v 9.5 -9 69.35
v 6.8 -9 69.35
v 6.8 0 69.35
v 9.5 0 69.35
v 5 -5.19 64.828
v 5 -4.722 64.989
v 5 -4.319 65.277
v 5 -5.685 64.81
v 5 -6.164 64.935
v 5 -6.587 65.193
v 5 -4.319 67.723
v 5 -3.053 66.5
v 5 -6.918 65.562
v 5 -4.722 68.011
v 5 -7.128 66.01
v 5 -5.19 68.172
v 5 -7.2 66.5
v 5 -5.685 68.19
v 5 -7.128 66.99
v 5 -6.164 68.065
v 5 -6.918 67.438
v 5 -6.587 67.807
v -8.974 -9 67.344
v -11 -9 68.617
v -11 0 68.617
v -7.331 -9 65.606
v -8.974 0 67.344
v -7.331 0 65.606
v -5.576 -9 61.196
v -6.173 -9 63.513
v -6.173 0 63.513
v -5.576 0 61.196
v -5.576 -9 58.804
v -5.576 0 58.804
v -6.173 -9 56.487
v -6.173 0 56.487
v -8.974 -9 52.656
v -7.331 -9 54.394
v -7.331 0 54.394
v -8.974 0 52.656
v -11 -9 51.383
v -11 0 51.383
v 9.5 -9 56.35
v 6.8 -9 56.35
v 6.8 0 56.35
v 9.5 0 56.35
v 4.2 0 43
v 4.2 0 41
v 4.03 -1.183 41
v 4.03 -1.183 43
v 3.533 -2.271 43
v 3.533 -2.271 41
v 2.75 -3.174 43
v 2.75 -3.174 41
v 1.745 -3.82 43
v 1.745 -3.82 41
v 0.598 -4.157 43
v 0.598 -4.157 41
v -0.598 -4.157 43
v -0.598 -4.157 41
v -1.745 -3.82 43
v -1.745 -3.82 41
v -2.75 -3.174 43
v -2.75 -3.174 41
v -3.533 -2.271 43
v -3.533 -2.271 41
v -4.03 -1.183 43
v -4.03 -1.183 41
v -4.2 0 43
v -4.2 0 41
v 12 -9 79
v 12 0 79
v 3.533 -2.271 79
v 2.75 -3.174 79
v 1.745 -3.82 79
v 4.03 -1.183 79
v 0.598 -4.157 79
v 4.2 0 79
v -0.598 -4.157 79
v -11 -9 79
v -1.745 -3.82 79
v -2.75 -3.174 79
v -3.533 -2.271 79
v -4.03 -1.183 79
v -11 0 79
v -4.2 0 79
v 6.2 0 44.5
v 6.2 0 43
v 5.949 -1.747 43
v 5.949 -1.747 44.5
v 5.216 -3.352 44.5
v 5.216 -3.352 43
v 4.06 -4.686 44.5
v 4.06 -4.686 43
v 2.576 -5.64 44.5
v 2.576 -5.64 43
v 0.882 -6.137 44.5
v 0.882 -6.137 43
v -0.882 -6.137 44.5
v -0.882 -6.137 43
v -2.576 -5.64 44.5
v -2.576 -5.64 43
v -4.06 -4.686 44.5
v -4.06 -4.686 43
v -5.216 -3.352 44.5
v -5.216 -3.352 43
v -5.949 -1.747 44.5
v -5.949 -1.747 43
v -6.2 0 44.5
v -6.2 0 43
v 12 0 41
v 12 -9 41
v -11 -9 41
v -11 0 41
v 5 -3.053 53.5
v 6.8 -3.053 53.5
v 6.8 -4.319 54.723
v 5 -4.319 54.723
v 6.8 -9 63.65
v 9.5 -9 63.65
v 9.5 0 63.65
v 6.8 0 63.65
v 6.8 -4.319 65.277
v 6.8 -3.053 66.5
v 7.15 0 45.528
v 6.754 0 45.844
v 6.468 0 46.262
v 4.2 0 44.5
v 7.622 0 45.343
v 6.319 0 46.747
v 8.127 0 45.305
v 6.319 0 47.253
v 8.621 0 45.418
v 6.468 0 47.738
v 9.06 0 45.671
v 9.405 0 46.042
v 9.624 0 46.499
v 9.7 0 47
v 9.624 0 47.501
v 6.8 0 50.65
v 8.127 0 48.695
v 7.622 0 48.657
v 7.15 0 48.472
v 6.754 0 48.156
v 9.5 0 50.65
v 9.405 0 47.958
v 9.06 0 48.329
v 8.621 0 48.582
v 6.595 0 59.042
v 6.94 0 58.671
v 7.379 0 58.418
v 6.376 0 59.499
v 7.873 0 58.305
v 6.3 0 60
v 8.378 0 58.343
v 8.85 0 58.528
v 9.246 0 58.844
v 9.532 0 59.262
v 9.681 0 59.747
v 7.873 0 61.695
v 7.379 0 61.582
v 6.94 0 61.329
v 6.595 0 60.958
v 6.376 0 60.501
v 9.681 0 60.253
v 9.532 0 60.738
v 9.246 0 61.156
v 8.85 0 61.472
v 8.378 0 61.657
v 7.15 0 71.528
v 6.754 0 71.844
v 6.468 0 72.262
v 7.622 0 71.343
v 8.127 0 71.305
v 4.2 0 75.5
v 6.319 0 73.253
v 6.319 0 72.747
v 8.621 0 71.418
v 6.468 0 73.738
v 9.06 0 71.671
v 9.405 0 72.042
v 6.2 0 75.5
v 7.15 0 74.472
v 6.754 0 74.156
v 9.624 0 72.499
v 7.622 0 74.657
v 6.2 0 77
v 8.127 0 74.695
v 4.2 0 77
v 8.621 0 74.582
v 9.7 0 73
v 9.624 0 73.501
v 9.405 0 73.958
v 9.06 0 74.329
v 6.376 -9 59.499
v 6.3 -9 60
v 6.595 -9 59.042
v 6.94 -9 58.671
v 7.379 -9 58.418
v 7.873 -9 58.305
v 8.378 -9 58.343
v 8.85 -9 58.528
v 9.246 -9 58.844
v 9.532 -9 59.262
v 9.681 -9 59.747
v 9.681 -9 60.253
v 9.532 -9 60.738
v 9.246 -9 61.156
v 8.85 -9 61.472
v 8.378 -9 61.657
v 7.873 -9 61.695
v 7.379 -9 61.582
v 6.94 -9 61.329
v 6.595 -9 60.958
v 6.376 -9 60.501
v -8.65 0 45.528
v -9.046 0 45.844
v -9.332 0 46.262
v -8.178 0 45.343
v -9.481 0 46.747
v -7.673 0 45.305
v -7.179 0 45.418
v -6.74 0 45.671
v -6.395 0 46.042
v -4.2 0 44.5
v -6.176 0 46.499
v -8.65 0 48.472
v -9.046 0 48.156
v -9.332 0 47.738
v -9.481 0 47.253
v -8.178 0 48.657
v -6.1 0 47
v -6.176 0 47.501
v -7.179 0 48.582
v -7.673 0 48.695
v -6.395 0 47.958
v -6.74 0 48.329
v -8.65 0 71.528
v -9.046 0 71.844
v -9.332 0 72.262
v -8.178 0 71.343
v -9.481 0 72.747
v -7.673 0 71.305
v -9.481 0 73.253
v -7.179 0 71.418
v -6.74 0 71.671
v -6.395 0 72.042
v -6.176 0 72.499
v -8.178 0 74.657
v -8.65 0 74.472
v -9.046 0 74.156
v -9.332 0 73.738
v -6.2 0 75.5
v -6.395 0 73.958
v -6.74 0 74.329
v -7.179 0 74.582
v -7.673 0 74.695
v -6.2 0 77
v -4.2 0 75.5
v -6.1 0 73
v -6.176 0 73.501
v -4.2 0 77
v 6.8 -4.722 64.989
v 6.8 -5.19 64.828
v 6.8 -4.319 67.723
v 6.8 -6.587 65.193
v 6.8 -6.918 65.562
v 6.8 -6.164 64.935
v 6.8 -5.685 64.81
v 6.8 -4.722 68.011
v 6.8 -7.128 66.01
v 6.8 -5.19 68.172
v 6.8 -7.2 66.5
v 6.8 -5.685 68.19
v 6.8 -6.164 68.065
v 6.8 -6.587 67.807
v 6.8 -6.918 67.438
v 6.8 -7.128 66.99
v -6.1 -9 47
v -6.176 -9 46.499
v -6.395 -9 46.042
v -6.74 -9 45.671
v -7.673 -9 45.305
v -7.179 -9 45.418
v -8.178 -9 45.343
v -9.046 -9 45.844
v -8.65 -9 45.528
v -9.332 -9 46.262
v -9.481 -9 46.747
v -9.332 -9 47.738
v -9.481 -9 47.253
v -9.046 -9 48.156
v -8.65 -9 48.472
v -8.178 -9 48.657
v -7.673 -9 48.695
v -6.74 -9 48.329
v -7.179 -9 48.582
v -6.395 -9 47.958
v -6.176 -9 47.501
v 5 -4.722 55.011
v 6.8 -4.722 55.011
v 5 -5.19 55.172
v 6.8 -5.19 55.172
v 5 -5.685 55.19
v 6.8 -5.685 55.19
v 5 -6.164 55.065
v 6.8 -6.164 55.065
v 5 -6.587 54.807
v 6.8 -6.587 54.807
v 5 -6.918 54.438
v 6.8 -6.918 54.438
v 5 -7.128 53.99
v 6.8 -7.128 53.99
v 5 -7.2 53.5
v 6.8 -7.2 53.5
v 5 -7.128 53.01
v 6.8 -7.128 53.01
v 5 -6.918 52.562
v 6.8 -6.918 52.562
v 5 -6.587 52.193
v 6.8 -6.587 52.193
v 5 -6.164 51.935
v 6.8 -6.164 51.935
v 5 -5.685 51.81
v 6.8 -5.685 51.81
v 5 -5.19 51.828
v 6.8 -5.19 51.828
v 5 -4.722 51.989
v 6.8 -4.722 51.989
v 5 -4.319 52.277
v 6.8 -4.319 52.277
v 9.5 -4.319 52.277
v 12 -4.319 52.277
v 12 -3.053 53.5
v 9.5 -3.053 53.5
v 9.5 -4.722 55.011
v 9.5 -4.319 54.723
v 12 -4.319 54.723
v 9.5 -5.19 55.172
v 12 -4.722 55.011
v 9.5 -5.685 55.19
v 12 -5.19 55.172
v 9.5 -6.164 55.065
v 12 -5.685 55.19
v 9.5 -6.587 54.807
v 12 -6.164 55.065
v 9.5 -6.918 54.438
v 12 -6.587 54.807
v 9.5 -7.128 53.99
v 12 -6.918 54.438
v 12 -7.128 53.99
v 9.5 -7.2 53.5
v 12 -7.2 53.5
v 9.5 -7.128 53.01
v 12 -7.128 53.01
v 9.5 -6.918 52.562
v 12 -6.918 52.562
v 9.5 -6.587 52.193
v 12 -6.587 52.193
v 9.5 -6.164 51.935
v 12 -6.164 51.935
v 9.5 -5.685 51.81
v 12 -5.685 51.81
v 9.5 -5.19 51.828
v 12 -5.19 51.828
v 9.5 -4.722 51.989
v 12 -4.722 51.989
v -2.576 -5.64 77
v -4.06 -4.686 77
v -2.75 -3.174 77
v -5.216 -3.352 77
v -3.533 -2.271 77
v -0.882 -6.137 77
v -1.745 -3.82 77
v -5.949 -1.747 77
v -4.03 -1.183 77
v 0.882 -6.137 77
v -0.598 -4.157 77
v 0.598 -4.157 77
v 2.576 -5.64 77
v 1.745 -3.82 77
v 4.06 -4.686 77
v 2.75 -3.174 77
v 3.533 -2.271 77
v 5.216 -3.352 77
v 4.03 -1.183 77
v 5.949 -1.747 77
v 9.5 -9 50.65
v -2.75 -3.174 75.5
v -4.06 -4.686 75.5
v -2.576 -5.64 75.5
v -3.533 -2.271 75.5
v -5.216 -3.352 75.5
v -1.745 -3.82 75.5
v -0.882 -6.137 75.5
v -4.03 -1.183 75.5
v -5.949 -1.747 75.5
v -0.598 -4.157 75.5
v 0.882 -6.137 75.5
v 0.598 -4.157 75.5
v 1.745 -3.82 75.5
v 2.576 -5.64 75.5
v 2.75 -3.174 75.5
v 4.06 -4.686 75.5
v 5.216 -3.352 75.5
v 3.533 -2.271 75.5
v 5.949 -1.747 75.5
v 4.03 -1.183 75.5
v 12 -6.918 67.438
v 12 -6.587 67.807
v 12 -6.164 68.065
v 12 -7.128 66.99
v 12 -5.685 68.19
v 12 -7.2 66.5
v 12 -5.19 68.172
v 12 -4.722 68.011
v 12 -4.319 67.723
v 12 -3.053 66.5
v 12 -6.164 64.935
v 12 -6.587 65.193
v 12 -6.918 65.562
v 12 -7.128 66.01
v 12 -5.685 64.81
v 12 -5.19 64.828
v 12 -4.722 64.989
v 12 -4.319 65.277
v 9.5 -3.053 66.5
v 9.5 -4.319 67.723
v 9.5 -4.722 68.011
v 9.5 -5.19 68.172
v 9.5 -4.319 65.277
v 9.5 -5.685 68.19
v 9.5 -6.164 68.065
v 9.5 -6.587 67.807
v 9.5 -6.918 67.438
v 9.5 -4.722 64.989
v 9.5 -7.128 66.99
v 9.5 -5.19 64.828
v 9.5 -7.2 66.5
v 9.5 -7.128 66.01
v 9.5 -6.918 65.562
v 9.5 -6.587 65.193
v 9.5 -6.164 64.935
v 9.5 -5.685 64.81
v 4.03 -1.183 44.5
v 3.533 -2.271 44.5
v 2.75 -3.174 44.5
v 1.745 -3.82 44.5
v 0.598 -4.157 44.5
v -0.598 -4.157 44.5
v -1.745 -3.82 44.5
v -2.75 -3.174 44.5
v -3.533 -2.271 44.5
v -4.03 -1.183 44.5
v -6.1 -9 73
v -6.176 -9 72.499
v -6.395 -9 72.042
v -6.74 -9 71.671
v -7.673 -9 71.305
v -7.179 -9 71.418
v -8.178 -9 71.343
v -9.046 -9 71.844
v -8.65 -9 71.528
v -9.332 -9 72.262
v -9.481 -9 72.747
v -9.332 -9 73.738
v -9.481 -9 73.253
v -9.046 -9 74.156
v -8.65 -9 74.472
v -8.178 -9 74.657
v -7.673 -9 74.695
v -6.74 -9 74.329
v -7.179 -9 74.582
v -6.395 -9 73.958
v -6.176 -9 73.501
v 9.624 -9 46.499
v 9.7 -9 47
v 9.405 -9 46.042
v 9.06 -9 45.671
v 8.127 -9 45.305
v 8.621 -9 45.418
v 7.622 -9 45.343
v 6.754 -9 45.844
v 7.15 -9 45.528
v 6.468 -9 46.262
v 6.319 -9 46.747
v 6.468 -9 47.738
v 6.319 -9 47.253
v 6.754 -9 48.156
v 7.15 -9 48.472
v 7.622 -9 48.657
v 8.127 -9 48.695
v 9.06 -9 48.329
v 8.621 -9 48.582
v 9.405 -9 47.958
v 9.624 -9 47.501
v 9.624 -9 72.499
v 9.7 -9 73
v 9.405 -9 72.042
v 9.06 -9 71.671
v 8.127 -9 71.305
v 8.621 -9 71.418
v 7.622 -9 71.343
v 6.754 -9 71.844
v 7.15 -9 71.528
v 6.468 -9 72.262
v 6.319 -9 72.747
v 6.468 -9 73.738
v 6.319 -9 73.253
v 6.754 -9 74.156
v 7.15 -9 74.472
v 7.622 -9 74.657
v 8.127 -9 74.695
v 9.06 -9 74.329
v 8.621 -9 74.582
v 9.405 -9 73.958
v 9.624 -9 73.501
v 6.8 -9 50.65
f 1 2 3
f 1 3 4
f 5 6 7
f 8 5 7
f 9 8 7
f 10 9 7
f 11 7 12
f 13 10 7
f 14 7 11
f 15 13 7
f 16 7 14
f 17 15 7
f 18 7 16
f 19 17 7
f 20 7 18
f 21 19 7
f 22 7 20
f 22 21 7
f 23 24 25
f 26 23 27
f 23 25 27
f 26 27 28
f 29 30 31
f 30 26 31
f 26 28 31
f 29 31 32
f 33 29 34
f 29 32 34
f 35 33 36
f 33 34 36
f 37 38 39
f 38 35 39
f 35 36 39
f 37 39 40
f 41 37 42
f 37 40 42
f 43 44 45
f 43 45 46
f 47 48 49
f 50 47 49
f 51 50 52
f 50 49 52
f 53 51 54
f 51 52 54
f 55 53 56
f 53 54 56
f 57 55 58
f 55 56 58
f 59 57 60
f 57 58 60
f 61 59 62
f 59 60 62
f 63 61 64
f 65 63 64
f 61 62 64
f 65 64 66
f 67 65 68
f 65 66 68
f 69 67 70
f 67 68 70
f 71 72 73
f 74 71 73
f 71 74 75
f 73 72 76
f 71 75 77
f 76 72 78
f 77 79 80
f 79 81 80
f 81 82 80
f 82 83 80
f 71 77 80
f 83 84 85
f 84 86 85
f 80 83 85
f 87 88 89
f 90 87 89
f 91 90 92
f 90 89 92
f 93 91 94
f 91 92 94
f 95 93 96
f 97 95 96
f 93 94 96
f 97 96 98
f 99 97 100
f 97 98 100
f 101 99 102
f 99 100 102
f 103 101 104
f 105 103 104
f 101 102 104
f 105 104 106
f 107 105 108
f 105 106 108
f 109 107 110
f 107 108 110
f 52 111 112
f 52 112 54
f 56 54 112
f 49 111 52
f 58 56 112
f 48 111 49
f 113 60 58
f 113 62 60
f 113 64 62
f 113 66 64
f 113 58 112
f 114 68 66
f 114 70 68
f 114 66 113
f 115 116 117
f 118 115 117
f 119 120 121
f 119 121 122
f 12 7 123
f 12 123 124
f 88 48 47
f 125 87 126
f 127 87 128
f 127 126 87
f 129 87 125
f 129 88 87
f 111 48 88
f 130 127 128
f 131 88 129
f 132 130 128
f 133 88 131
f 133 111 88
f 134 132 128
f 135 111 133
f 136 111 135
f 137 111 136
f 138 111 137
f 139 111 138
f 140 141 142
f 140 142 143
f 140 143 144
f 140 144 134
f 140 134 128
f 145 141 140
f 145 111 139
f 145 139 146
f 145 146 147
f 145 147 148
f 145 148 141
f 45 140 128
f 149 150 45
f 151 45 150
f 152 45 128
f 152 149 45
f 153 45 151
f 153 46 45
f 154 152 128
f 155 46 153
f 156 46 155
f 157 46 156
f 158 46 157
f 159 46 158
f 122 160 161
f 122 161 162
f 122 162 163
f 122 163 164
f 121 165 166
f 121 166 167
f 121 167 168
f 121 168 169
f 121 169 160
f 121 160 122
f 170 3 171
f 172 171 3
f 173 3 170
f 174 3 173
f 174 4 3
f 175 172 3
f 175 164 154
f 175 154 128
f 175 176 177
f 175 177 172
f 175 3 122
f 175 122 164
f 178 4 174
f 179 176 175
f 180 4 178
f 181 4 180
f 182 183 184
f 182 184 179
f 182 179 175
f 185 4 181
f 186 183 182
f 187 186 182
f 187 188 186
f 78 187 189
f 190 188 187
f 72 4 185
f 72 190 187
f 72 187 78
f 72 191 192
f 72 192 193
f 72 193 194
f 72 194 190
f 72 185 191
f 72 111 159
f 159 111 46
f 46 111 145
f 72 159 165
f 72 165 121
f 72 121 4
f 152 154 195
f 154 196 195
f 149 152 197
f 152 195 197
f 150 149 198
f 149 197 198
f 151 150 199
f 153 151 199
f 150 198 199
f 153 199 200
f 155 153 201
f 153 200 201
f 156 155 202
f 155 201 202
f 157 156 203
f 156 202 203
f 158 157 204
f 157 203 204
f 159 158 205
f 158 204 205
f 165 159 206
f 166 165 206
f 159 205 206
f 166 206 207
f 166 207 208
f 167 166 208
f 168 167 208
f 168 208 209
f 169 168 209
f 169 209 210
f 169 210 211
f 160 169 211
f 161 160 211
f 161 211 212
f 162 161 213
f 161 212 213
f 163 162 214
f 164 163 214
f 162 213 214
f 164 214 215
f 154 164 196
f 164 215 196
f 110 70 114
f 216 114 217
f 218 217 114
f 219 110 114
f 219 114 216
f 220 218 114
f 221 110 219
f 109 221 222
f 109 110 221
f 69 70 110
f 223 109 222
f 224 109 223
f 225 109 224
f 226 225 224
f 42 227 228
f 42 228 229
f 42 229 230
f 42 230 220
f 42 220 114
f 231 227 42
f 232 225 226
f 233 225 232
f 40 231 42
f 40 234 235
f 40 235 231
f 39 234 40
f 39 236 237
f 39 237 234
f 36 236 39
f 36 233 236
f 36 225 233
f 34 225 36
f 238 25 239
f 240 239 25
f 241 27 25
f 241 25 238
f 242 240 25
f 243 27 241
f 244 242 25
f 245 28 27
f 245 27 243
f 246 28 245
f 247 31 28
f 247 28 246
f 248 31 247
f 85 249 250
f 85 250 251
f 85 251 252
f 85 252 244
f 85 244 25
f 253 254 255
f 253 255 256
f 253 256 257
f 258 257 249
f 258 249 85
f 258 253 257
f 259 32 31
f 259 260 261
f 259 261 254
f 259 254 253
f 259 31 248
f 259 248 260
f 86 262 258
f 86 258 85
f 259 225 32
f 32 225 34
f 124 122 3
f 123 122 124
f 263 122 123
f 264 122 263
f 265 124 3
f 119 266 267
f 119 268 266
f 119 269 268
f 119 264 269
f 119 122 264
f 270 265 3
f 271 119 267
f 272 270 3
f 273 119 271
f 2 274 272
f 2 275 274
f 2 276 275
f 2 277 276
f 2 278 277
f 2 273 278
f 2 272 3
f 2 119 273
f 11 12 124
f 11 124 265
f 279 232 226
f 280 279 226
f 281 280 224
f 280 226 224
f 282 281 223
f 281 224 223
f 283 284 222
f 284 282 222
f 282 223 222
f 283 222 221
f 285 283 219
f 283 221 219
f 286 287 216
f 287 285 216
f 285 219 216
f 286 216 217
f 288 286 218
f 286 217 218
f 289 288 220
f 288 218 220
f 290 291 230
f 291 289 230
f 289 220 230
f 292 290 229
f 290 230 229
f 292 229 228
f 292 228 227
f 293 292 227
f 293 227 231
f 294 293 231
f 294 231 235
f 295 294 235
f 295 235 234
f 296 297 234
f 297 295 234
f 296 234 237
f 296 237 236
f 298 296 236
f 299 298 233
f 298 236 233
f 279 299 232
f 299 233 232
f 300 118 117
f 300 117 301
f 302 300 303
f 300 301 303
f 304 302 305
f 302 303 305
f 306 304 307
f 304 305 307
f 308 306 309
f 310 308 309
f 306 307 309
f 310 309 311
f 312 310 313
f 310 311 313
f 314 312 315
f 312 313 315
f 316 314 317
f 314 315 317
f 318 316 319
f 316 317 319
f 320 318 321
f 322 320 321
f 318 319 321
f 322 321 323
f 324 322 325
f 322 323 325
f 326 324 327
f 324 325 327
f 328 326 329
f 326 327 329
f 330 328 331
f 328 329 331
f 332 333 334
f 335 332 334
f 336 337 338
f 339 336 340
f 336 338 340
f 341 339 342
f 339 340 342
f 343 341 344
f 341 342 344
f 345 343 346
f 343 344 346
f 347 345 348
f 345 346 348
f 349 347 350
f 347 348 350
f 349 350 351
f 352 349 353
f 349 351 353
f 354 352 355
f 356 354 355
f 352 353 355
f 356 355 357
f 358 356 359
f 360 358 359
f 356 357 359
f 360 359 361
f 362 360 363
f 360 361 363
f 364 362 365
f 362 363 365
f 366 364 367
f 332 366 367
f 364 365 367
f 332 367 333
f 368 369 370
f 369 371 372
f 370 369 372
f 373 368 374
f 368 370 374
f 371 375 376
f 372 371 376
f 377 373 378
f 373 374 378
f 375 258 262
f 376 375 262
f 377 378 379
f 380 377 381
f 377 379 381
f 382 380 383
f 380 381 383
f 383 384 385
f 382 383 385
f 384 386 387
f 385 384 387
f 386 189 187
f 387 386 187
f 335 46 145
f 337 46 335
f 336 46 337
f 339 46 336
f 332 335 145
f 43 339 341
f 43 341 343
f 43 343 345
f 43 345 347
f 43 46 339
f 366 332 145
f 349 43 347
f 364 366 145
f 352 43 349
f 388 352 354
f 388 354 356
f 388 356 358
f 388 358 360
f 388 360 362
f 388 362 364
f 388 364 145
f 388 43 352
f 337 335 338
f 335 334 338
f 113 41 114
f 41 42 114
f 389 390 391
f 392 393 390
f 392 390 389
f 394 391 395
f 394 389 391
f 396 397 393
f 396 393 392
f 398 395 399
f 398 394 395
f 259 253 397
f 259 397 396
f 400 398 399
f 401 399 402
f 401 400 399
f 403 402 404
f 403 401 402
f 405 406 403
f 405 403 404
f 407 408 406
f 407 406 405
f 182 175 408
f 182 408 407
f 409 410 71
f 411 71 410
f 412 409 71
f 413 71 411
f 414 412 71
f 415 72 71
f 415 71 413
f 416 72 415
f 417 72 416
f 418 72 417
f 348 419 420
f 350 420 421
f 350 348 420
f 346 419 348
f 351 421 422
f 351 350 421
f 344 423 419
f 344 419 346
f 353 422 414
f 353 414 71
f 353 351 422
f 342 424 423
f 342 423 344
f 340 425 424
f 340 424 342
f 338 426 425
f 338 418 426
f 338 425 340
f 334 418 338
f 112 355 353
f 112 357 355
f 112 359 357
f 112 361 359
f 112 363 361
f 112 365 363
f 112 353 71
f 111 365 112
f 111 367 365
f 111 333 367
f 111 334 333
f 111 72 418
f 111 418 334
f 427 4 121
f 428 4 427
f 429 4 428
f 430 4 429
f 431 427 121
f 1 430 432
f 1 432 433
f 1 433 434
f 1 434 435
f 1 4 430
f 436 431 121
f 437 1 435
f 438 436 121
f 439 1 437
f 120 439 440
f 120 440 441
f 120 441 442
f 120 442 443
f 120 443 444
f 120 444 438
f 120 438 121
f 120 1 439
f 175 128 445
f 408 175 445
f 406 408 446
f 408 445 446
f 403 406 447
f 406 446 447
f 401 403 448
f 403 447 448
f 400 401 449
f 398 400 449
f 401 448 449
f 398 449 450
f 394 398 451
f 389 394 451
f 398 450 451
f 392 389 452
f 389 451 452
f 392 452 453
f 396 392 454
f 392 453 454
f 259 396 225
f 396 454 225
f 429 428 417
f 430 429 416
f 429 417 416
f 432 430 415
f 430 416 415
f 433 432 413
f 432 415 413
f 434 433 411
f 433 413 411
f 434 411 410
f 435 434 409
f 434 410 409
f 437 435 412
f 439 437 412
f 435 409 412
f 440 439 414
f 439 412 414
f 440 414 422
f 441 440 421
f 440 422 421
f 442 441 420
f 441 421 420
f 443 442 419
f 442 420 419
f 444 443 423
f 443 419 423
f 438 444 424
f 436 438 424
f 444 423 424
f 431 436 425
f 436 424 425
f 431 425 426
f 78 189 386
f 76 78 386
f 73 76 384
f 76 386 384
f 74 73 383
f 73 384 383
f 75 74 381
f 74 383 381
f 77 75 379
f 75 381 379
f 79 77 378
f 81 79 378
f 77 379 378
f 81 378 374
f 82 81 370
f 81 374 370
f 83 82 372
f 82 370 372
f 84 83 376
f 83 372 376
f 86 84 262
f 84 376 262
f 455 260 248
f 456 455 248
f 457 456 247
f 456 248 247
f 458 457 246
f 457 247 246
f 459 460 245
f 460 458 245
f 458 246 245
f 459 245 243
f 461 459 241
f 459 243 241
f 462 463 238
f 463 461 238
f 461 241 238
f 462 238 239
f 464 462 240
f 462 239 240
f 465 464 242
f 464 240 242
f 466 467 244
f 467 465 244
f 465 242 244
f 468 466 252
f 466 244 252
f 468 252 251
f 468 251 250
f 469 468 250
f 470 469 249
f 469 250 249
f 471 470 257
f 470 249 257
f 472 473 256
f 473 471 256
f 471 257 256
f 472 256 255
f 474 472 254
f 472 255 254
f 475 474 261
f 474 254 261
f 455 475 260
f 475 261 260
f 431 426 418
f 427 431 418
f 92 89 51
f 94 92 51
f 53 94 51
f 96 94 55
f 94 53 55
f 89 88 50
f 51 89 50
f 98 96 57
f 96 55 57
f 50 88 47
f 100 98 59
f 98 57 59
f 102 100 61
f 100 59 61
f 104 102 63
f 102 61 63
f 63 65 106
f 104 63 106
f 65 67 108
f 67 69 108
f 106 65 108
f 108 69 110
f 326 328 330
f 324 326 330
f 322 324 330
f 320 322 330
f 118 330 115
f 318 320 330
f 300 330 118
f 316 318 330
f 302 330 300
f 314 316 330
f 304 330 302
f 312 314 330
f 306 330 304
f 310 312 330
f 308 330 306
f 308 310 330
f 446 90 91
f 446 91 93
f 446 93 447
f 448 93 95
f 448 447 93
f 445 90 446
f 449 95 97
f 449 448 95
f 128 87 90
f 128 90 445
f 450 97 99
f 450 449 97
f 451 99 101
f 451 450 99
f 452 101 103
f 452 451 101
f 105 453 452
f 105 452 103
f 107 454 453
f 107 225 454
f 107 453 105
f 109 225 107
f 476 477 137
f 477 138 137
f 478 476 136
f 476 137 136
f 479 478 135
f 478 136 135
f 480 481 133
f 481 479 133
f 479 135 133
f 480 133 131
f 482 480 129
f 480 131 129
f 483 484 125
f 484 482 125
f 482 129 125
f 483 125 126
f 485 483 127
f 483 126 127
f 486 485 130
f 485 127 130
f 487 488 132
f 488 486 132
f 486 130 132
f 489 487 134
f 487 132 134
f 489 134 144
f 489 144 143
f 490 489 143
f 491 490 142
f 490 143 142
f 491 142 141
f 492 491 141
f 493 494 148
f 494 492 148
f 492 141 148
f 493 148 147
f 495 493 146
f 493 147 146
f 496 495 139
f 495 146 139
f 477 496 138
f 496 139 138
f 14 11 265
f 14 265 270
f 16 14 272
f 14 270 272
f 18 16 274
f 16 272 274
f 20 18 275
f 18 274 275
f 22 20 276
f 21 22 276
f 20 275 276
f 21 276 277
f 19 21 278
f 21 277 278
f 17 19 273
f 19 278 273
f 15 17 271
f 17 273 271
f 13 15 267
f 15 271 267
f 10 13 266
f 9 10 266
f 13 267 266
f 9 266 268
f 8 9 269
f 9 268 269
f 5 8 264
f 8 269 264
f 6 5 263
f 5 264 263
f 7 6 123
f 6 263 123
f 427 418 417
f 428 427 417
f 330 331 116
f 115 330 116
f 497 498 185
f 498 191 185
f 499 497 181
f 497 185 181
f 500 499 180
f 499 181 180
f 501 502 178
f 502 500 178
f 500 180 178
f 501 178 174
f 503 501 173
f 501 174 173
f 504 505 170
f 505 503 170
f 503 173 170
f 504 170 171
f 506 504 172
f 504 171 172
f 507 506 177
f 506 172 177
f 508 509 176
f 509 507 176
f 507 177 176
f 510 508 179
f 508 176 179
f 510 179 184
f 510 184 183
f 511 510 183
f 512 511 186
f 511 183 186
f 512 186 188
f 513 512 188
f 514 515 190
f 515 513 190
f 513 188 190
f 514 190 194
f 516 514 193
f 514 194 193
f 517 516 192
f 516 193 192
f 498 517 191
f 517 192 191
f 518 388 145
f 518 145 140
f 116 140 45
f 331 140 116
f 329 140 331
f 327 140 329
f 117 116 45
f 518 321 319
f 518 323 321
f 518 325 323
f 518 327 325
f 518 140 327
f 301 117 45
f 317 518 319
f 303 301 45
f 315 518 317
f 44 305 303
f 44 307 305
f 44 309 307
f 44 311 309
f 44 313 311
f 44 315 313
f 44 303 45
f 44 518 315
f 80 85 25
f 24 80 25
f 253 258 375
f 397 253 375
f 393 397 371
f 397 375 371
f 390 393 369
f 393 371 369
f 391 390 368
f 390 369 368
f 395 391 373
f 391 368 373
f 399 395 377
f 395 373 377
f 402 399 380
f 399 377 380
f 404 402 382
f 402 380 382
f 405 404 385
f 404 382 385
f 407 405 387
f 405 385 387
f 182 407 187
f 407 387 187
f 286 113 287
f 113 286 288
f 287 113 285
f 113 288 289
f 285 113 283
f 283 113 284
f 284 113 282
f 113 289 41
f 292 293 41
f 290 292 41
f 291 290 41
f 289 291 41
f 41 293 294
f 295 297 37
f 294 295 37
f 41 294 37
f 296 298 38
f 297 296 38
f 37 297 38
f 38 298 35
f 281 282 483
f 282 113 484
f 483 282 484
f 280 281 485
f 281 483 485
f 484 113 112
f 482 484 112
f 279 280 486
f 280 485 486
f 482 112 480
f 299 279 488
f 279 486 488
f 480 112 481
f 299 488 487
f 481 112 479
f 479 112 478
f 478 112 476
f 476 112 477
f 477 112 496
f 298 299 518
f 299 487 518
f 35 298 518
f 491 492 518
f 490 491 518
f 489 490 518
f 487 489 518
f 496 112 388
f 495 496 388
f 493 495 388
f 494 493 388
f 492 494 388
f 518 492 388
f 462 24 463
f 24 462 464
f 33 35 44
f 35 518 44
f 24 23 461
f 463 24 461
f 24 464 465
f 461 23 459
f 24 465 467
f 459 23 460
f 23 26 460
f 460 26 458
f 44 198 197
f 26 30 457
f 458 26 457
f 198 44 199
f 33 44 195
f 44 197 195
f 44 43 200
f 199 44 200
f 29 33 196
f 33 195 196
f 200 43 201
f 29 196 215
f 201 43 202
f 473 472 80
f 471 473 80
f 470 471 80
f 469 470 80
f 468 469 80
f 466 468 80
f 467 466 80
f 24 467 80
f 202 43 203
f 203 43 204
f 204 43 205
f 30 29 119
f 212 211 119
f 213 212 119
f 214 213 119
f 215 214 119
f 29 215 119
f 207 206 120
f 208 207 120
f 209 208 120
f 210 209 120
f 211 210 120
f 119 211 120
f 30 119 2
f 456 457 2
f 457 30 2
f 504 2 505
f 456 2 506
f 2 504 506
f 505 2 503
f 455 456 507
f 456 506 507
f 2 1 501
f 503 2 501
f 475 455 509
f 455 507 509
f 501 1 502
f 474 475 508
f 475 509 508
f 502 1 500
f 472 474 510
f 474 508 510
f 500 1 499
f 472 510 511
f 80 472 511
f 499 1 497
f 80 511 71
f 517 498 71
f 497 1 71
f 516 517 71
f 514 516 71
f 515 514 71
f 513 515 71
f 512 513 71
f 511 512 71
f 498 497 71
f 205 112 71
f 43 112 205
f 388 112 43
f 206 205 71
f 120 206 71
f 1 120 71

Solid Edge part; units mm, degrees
sketch "Sketch1" plane through (0, 0, 0) normal (0, -1, 0) x (1, 0, 0)
  circle A0 centre (-7.8, 73) radius 1.7
  circle A1 centre (8, 73) radius 1.7
  circle A2 centre (8, 47) radius 1.7
  circle A3 centre (-7.8, 47) radius 1.7
  line L0 (12, 79) -> (12, 41)
  line L1 (12, 41) -> (-11, 41)
  line L2 (-11, 51.3832) -> (-11, 41)
  line L3 (-11, 79) -> (-11, 68.6168)
  line L4 (12, 79) -> (-11, 79)
  arc A4 (-11, 51.3832) -> (-11, 68.6168) centre (-15, 60) ccw
extrude "Protrusion1" add sketch "Sketch1" along normal blind 9
sketch "Sketch2" plane through (-0.1, -4, 41) normal (0, 0, -1) x (-1, 0, 0)
  circle A0 centre (-0.1, 4) radius 4.2
  dimension "D1" = 8.4
extrude "Cutout1" cut sketch "Sketch2" against normal through all
sketch "Sketch3" plane through (-0.1, -4, 77) normal (0, 0, 1) x (-1, 0, 0)
  circle A0 centre (-0.1, -4) radius 6.2
extrude "ExtrudedCutout_2" cut sketch "Sketch3" against normal blind 1.5
sketch "Sketch4" plane through (-0.1, -4, 43) normal (0, 0, -1) x (-1, 0, 0)
  circle A0 centre (-0.1, 4) radius 6.2
extrude "ExtrudedCutout_3" cut sketch "Sketch4" against normal blind 1.5
sketch "Sketch5" plane through (12, -4.5, 61.3992) normal (1, 0, 0) x (0, 0, 1)
  line L0 (3.8779, -0.1809) -> (5.1008, -1.4472)
  line L1 (5.1008, -1.4472) -> (6.3237, -0.1809)
  arc A0 (6.3237, -0.1809) -> (3.8779, -0.1809) centre (5.1008, 1) ccw
  line L2 (-9.1221, -0.1809) -> (-7.8992, -1.4472)
  line L3 (-7.8992, -1.4472) -> (-6.6763, -0.1809)
  arc A1 (-6.6763, -0.1809) -> (-9.1221, -0.1809) centre (-7.8992, 1) ccw
extrude "Cutout2" cut sketch "Sketch5" against normal up to vertex (7 mm away)
sketch "Sketch6" plane through (-0.1, -9, 61.3992) normal (0, -1, 0) x (1, 0, 0)
  line L0 (6.9, 2.2508) -> (6.9, 7.9508)
  line L1 (6.9, 7.9508) -> (9.6, 7.9508)
  line L2 (9.6, 7.9508) -> (9.6, 2.2508)
  line L3 (9.6, 2.2508) -> (6.9, 2.2508)
  line L4 (6.9, -5.0492) -> (9.6, -5.0492)
  line L5 (9.6, -5.0492) -> (9.6, -10.7492)
  line L6 (9.6, -10.7492) -> (6.9, -10.7492)
  line L7 (6.9, -10.7492) -> (6.9, -5.0492)
extrude "Cutout3" cut sketch "Sketch6" against normal through all
sketch "Sketch7" plane through (-0.1, -9, 61.3992) normal (0, -1, 0) x (-1, 0, 0)
  circle A0 centre (-8.1, 1.3992) radius 1.7
extrude "Cutout4" cut sketch "Sketch7" against normal through all
